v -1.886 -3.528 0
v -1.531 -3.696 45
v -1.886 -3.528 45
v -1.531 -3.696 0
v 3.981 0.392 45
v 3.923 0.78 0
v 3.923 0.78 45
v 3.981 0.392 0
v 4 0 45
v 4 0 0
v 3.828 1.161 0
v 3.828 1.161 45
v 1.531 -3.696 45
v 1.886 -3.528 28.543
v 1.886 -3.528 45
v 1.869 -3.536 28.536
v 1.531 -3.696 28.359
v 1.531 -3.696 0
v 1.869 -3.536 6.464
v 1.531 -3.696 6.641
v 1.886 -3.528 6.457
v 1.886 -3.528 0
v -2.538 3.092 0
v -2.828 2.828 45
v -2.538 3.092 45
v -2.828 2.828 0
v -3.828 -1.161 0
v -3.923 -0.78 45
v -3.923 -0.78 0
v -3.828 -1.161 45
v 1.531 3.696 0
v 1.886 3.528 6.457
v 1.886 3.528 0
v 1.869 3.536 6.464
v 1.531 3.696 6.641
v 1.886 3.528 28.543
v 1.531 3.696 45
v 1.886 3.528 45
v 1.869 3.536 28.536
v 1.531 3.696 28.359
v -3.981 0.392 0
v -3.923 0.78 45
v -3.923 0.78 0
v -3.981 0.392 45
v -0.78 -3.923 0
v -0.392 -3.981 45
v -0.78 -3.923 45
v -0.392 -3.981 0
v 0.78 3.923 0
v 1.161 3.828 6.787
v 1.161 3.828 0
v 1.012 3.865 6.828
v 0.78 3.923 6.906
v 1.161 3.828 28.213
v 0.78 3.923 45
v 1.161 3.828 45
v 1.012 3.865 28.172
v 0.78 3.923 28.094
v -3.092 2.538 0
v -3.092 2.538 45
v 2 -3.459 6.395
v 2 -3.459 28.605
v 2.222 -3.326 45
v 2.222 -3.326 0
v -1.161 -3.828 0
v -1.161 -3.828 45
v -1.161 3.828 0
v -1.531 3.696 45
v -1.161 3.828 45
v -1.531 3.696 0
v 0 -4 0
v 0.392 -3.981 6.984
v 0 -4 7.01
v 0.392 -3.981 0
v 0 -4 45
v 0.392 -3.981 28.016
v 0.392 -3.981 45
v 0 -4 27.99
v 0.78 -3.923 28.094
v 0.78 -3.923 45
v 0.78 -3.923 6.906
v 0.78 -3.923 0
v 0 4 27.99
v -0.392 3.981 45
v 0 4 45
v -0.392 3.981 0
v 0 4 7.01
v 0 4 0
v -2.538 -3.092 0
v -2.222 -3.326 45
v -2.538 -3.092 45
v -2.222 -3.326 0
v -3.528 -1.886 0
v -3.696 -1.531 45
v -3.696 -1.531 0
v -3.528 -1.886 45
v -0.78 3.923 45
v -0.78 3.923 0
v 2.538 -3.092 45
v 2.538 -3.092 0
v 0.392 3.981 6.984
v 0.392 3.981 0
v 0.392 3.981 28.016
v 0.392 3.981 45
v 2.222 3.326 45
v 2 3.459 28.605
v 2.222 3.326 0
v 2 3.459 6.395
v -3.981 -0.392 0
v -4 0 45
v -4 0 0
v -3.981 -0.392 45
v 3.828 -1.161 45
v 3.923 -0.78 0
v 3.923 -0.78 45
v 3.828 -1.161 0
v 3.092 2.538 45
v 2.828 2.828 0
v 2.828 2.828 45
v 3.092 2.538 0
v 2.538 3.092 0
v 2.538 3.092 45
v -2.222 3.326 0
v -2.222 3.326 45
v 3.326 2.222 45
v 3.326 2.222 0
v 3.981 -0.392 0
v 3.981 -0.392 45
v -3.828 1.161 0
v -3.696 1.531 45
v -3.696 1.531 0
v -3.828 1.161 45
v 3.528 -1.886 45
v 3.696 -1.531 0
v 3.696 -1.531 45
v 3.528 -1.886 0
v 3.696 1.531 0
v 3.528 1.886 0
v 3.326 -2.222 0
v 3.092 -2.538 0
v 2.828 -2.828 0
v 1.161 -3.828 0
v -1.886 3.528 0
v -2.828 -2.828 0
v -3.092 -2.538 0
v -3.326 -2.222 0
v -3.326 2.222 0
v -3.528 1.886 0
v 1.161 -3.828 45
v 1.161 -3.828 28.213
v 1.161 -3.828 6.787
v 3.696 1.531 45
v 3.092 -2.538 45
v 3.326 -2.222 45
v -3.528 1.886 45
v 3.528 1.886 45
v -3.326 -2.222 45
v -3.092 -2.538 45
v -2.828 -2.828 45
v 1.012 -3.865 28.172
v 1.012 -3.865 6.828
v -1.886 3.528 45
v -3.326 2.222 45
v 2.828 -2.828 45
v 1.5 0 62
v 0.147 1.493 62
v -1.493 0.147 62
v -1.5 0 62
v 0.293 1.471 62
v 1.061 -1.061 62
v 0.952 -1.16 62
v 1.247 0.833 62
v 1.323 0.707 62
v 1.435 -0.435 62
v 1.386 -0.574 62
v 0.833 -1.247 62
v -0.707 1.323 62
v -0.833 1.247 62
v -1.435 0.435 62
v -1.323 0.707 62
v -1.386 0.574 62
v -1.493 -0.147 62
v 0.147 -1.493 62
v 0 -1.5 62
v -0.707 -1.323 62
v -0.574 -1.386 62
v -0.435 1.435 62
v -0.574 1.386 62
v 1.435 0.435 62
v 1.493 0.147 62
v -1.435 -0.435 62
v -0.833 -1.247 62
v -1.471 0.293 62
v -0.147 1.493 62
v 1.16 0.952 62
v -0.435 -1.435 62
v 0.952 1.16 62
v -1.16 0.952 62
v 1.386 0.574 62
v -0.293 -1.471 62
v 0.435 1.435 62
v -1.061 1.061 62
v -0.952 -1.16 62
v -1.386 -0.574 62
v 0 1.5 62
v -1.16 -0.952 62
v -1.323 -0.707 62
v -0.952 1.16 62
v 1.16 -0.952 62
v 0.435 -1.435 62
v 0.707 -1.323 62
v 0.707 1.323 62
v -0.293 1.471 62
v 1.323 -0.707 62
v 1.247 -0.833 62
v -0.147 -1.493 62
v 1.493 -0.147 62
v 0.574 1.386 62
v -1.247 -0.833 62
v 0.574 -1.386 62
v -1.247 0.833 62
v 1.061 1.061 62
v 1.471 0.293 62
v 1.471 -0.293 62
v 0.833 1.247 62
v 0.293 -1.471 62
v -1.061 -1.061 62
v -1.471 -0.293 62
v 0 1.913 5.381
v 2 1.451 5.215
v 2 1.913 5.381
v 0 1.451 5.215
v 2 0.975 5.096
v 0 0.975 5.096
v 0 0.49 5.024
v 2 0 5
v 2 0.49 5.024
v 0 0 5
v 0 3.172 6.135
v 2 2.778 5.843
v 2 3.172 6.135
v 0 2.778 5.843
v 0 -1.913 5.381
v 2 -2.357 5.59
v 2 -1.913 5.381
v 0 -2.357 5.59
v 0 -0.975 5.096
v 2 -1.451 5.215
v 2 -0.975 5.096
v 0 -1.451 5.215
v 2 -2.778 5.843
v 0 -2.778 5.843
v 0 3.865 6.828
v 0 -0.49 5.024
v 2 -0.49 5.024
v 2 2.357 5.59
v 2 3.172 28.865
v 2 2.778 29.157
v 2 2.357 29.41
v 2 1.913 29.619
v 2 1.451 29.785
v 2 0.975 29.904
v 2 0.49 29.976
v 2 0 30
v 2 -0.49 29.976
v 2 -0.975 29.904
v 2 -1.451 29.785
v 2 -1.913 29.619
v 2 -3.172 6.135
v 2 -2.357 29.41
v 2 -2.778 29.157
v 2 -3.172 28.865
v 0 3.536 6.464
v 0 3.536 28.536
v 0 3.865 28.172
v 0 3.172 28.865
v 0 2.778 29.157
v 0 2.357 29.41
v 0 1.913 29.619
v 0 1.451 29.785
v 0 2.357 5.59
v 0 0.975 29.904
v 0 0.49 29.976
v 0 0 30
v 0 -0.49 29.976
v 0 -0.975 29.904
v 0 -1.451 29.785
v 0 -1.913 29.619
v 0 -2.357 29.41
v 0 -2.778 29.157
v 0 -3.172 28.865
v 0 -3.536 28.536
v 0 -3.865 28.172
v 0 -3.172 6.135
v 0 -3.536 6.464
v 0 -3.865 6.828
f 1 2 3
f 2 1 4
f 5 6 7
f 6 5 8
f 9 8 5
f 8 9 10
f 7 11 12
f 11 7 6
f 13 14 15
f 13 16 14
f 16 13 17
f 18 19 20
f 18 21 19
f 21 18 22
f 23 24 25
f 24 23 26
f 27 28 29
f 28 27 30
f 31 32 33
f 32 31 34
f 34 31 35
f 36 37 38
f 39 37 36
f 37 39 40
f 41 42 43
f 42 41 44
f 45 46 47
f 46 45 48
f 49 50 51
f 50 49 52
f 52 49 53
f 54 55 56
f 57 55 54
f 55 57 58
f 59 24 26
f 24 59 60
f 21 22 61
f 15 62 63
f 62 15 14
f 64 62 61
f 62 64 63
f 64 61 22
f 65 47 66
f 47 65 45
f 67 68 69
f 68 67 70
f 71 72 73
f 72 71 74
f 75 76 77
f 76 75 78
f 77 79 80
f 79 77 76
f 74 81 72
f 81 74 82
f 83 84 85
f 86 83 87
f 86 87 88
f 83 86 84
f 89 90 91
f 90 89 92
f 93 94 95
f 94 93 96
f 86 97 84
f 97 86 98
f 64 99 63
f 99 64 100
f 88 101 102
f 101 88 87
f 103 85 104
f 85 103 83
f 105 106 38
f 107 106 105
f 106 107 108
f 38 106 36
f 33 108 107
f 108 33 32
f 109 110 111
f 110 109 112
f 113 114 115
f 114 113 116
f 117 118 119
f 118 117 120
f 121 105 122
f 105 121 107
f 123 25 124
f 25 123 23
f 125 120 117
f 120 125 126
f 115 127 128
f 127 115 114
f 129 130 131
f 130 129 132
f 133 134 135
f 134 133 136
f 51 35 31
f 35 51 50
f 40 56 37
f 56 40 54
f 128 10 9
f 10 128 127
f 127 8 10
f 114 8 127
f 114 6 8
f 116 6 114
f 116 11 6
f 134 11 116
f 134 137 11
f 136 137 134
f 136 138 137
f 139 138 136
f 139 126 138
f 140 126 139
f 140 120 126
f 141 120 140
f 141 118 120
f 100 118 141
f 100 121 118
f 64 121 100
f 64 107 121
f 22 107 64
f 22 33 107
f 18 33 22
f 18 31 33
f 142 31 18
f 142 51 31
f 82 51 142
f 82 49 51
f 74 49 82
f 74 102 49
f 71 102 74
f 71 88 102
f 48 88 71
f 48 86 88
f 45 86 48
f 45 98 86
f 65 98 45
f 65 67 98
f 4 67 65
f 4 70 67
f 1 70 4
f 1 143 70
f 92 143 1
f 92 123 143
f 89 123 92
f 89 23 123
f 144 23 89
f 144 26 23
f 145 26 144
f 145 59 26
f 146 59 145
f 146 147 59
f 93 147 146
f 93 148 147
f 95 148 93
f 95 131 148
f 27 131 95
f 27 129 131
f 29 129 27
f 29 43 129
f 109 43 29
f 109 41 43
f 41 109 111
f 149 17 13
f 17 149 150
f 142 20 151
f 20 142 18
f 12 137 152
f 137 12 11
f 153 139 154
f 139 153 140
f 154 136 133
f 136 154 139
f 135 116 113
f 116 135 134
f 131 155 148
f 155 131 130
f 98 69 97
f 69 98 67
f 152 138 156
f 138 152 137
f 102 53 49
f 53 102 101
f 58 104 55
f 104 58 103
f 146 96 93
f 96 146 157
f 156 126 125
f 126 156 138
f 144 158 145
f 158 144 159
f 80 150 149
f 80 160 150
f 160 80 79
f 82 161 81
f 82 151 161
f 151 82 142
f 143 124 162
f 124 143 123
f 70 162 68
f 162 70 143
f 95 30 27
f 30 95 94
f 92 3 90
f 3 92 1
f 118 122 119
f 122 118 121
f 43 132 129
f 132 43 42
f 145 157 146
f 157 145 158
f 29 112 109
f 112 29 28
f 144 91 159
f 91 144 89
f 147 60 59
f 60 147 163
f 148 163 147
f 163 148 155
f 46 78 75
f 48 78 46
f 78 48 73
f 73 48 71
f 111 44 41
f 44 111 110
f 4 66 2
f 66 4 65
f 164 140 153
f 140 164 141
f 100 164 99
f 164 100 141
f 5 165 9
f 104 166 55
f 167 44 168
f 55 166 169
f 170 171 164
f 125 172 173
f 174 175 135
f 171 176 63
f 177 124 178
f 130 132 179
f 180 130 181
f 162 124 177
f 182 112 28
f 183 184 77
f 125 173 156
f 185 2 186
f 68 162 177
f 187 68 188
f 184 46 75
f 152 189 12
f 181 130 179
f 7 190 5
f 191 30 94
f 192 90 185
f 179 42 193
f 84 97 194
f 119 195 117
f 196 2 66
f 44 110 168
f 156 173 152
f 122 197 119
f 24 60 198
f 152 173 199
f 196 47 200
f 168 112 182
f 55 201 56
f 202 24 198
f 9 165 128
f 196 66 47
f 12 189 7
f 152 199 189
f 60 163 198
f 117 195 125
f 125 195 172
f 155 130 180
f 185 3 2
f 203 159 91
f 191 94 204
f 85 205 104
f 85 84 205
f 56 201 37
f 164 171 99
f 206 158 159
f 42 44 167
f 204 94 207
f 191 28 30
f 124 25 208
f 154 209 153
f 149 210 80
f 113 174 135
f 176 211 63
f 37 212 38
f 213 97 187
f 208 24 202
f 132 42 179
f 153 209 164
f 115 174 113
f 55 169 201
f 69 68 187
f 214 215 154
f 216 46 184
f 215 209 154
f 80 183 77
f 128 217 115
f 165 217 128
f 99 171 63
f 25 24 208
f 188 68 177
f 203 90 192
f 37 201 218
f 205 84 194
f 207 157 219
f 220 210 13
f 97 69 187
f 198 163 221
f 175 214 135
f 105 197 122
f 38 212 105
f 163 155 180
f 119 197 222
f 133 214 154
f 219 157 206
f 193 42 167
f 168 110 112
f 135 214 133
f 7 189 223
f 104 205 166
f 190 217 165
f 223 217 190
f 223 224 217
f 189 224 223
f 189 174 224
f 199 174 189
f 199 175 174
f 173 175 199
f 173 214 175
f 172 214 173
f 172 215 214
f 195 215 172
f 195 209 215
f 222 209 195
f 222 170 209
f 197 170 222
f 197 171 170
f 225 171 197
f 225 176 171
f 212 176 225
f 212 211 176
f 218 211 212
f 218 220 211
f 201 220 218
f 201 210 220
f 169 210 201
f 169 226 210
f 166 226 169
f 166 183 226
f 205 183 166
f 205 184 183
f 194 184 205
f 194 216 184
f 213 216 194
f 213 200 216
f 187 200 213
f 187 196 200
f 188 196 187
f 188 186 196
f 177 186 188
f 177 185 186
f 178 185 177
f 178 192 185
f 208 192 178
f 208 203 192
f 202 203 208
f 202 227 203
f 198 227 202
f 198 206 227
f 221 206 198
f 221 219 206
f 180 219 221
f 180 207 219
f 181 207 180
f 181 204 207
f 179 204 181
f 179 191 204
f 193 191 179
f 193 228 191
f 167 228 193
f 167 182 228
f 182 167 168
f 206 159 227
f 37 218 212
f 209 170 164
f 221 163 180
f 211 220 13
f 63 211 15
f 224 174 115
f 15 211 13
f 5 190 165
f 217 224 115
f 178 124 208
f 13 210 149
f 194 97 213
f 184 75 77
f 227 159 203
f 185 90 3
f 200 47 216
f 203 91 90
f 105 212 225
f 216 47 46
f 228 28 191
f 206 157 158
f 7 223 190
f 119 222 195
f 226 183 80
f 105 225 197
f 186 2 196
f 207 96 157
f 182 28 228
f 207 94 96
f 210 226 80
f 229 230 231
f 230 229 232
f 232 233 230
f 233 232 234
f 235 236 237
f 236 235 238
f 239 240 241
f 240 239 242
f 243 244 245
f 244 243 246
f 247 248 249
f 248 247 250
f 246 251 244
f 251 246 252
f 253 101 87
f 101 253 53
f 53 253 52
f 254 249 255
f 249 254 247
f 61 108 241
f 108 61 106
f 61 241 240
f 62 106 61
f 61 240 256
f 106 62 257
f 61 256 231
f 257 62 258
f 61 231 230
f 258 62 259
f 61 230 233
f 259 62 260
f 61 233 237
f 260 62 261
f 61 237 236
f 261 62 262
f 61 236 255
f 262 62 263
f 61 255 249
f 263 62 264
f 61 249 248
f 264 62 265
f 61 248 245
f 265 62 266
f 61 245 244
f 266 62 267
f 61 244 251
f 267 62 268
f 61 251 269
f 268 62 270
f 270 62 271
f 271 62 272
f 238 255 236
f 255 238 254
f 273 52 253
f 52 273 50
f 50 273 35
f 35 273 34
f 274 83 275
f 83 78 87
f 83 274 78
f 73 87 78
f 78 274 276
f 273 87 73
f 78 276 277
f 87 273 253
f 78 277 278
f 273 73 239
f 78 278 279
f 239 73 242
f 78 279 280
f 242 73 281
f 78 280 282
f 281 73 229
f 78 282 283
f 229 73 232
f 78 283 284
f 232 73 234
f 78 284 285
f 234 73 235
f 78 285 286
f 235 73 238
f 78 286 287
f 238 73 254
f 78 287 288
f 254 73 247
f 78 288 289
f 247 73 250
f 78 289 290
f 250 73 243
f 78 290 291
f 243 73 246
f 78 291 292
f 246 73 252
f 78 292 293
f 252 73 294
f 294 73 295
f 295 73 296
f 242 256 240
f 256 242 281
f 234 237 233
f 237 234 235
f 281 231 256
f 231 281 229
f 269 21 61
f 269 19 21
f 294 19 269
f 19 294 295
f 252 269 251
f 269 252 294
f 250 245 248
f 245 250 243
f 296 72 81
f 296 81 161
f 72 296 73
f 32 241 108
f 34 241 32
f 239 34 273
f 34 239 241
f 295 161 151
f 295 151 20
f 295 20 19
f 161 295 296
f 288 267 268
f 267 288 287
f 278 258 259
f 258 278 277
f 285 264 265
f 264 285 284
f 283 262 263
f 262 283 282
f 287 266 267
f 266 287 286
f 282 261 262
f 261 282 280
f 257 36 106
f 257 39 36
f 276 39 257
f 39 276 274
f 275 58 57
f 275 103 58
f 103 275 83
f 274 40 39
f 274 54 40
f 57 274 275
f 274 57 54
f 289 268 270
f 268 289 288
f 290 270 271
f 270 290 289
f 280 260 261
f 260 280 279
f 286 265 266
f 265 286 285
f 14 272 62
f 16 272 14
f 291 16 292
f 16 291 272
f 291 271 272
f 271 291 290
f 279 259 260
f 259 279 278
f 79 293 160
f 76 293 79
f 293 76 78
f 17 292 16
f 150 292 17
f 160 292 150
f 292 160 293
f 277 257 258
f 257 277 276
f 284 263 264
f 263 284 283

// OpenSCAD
// Pestle for grinding tissue inside a 1.5 mL microcentrifuge tube - a cylindrical handle with
// grip grooves, a tapering cone, and a rounded tip. NOVEL general part, printable standing
// upright.
//

handle_d = 8;
cone_top = 8;
cone_bot = 3;
tip_d    = 3;
grooves  = 4;
width    = 2;
depth    = 1;

$fn = 64;

handle_h = 45;
cone_h   = 62 - 45;
tip_h    = 62 + tip_d / 2;

difference() {
    union() {
        cylinder(h = handle_h, d = handle_d);
        translate([0, 0, handle_h]) cylinder(h = cone_h, d1 = cone_top, d2 = cone_bot);
        translate([0, 0, 62 - tip_d / 2]) sphere(d = tip_d);
    }
    for (z = [10, 15, 20, 25])
        translate([0, 0, z]) rotate([0, 90, 0]) cylinder(h = width, d = handle_d + 2 * depth);
}
